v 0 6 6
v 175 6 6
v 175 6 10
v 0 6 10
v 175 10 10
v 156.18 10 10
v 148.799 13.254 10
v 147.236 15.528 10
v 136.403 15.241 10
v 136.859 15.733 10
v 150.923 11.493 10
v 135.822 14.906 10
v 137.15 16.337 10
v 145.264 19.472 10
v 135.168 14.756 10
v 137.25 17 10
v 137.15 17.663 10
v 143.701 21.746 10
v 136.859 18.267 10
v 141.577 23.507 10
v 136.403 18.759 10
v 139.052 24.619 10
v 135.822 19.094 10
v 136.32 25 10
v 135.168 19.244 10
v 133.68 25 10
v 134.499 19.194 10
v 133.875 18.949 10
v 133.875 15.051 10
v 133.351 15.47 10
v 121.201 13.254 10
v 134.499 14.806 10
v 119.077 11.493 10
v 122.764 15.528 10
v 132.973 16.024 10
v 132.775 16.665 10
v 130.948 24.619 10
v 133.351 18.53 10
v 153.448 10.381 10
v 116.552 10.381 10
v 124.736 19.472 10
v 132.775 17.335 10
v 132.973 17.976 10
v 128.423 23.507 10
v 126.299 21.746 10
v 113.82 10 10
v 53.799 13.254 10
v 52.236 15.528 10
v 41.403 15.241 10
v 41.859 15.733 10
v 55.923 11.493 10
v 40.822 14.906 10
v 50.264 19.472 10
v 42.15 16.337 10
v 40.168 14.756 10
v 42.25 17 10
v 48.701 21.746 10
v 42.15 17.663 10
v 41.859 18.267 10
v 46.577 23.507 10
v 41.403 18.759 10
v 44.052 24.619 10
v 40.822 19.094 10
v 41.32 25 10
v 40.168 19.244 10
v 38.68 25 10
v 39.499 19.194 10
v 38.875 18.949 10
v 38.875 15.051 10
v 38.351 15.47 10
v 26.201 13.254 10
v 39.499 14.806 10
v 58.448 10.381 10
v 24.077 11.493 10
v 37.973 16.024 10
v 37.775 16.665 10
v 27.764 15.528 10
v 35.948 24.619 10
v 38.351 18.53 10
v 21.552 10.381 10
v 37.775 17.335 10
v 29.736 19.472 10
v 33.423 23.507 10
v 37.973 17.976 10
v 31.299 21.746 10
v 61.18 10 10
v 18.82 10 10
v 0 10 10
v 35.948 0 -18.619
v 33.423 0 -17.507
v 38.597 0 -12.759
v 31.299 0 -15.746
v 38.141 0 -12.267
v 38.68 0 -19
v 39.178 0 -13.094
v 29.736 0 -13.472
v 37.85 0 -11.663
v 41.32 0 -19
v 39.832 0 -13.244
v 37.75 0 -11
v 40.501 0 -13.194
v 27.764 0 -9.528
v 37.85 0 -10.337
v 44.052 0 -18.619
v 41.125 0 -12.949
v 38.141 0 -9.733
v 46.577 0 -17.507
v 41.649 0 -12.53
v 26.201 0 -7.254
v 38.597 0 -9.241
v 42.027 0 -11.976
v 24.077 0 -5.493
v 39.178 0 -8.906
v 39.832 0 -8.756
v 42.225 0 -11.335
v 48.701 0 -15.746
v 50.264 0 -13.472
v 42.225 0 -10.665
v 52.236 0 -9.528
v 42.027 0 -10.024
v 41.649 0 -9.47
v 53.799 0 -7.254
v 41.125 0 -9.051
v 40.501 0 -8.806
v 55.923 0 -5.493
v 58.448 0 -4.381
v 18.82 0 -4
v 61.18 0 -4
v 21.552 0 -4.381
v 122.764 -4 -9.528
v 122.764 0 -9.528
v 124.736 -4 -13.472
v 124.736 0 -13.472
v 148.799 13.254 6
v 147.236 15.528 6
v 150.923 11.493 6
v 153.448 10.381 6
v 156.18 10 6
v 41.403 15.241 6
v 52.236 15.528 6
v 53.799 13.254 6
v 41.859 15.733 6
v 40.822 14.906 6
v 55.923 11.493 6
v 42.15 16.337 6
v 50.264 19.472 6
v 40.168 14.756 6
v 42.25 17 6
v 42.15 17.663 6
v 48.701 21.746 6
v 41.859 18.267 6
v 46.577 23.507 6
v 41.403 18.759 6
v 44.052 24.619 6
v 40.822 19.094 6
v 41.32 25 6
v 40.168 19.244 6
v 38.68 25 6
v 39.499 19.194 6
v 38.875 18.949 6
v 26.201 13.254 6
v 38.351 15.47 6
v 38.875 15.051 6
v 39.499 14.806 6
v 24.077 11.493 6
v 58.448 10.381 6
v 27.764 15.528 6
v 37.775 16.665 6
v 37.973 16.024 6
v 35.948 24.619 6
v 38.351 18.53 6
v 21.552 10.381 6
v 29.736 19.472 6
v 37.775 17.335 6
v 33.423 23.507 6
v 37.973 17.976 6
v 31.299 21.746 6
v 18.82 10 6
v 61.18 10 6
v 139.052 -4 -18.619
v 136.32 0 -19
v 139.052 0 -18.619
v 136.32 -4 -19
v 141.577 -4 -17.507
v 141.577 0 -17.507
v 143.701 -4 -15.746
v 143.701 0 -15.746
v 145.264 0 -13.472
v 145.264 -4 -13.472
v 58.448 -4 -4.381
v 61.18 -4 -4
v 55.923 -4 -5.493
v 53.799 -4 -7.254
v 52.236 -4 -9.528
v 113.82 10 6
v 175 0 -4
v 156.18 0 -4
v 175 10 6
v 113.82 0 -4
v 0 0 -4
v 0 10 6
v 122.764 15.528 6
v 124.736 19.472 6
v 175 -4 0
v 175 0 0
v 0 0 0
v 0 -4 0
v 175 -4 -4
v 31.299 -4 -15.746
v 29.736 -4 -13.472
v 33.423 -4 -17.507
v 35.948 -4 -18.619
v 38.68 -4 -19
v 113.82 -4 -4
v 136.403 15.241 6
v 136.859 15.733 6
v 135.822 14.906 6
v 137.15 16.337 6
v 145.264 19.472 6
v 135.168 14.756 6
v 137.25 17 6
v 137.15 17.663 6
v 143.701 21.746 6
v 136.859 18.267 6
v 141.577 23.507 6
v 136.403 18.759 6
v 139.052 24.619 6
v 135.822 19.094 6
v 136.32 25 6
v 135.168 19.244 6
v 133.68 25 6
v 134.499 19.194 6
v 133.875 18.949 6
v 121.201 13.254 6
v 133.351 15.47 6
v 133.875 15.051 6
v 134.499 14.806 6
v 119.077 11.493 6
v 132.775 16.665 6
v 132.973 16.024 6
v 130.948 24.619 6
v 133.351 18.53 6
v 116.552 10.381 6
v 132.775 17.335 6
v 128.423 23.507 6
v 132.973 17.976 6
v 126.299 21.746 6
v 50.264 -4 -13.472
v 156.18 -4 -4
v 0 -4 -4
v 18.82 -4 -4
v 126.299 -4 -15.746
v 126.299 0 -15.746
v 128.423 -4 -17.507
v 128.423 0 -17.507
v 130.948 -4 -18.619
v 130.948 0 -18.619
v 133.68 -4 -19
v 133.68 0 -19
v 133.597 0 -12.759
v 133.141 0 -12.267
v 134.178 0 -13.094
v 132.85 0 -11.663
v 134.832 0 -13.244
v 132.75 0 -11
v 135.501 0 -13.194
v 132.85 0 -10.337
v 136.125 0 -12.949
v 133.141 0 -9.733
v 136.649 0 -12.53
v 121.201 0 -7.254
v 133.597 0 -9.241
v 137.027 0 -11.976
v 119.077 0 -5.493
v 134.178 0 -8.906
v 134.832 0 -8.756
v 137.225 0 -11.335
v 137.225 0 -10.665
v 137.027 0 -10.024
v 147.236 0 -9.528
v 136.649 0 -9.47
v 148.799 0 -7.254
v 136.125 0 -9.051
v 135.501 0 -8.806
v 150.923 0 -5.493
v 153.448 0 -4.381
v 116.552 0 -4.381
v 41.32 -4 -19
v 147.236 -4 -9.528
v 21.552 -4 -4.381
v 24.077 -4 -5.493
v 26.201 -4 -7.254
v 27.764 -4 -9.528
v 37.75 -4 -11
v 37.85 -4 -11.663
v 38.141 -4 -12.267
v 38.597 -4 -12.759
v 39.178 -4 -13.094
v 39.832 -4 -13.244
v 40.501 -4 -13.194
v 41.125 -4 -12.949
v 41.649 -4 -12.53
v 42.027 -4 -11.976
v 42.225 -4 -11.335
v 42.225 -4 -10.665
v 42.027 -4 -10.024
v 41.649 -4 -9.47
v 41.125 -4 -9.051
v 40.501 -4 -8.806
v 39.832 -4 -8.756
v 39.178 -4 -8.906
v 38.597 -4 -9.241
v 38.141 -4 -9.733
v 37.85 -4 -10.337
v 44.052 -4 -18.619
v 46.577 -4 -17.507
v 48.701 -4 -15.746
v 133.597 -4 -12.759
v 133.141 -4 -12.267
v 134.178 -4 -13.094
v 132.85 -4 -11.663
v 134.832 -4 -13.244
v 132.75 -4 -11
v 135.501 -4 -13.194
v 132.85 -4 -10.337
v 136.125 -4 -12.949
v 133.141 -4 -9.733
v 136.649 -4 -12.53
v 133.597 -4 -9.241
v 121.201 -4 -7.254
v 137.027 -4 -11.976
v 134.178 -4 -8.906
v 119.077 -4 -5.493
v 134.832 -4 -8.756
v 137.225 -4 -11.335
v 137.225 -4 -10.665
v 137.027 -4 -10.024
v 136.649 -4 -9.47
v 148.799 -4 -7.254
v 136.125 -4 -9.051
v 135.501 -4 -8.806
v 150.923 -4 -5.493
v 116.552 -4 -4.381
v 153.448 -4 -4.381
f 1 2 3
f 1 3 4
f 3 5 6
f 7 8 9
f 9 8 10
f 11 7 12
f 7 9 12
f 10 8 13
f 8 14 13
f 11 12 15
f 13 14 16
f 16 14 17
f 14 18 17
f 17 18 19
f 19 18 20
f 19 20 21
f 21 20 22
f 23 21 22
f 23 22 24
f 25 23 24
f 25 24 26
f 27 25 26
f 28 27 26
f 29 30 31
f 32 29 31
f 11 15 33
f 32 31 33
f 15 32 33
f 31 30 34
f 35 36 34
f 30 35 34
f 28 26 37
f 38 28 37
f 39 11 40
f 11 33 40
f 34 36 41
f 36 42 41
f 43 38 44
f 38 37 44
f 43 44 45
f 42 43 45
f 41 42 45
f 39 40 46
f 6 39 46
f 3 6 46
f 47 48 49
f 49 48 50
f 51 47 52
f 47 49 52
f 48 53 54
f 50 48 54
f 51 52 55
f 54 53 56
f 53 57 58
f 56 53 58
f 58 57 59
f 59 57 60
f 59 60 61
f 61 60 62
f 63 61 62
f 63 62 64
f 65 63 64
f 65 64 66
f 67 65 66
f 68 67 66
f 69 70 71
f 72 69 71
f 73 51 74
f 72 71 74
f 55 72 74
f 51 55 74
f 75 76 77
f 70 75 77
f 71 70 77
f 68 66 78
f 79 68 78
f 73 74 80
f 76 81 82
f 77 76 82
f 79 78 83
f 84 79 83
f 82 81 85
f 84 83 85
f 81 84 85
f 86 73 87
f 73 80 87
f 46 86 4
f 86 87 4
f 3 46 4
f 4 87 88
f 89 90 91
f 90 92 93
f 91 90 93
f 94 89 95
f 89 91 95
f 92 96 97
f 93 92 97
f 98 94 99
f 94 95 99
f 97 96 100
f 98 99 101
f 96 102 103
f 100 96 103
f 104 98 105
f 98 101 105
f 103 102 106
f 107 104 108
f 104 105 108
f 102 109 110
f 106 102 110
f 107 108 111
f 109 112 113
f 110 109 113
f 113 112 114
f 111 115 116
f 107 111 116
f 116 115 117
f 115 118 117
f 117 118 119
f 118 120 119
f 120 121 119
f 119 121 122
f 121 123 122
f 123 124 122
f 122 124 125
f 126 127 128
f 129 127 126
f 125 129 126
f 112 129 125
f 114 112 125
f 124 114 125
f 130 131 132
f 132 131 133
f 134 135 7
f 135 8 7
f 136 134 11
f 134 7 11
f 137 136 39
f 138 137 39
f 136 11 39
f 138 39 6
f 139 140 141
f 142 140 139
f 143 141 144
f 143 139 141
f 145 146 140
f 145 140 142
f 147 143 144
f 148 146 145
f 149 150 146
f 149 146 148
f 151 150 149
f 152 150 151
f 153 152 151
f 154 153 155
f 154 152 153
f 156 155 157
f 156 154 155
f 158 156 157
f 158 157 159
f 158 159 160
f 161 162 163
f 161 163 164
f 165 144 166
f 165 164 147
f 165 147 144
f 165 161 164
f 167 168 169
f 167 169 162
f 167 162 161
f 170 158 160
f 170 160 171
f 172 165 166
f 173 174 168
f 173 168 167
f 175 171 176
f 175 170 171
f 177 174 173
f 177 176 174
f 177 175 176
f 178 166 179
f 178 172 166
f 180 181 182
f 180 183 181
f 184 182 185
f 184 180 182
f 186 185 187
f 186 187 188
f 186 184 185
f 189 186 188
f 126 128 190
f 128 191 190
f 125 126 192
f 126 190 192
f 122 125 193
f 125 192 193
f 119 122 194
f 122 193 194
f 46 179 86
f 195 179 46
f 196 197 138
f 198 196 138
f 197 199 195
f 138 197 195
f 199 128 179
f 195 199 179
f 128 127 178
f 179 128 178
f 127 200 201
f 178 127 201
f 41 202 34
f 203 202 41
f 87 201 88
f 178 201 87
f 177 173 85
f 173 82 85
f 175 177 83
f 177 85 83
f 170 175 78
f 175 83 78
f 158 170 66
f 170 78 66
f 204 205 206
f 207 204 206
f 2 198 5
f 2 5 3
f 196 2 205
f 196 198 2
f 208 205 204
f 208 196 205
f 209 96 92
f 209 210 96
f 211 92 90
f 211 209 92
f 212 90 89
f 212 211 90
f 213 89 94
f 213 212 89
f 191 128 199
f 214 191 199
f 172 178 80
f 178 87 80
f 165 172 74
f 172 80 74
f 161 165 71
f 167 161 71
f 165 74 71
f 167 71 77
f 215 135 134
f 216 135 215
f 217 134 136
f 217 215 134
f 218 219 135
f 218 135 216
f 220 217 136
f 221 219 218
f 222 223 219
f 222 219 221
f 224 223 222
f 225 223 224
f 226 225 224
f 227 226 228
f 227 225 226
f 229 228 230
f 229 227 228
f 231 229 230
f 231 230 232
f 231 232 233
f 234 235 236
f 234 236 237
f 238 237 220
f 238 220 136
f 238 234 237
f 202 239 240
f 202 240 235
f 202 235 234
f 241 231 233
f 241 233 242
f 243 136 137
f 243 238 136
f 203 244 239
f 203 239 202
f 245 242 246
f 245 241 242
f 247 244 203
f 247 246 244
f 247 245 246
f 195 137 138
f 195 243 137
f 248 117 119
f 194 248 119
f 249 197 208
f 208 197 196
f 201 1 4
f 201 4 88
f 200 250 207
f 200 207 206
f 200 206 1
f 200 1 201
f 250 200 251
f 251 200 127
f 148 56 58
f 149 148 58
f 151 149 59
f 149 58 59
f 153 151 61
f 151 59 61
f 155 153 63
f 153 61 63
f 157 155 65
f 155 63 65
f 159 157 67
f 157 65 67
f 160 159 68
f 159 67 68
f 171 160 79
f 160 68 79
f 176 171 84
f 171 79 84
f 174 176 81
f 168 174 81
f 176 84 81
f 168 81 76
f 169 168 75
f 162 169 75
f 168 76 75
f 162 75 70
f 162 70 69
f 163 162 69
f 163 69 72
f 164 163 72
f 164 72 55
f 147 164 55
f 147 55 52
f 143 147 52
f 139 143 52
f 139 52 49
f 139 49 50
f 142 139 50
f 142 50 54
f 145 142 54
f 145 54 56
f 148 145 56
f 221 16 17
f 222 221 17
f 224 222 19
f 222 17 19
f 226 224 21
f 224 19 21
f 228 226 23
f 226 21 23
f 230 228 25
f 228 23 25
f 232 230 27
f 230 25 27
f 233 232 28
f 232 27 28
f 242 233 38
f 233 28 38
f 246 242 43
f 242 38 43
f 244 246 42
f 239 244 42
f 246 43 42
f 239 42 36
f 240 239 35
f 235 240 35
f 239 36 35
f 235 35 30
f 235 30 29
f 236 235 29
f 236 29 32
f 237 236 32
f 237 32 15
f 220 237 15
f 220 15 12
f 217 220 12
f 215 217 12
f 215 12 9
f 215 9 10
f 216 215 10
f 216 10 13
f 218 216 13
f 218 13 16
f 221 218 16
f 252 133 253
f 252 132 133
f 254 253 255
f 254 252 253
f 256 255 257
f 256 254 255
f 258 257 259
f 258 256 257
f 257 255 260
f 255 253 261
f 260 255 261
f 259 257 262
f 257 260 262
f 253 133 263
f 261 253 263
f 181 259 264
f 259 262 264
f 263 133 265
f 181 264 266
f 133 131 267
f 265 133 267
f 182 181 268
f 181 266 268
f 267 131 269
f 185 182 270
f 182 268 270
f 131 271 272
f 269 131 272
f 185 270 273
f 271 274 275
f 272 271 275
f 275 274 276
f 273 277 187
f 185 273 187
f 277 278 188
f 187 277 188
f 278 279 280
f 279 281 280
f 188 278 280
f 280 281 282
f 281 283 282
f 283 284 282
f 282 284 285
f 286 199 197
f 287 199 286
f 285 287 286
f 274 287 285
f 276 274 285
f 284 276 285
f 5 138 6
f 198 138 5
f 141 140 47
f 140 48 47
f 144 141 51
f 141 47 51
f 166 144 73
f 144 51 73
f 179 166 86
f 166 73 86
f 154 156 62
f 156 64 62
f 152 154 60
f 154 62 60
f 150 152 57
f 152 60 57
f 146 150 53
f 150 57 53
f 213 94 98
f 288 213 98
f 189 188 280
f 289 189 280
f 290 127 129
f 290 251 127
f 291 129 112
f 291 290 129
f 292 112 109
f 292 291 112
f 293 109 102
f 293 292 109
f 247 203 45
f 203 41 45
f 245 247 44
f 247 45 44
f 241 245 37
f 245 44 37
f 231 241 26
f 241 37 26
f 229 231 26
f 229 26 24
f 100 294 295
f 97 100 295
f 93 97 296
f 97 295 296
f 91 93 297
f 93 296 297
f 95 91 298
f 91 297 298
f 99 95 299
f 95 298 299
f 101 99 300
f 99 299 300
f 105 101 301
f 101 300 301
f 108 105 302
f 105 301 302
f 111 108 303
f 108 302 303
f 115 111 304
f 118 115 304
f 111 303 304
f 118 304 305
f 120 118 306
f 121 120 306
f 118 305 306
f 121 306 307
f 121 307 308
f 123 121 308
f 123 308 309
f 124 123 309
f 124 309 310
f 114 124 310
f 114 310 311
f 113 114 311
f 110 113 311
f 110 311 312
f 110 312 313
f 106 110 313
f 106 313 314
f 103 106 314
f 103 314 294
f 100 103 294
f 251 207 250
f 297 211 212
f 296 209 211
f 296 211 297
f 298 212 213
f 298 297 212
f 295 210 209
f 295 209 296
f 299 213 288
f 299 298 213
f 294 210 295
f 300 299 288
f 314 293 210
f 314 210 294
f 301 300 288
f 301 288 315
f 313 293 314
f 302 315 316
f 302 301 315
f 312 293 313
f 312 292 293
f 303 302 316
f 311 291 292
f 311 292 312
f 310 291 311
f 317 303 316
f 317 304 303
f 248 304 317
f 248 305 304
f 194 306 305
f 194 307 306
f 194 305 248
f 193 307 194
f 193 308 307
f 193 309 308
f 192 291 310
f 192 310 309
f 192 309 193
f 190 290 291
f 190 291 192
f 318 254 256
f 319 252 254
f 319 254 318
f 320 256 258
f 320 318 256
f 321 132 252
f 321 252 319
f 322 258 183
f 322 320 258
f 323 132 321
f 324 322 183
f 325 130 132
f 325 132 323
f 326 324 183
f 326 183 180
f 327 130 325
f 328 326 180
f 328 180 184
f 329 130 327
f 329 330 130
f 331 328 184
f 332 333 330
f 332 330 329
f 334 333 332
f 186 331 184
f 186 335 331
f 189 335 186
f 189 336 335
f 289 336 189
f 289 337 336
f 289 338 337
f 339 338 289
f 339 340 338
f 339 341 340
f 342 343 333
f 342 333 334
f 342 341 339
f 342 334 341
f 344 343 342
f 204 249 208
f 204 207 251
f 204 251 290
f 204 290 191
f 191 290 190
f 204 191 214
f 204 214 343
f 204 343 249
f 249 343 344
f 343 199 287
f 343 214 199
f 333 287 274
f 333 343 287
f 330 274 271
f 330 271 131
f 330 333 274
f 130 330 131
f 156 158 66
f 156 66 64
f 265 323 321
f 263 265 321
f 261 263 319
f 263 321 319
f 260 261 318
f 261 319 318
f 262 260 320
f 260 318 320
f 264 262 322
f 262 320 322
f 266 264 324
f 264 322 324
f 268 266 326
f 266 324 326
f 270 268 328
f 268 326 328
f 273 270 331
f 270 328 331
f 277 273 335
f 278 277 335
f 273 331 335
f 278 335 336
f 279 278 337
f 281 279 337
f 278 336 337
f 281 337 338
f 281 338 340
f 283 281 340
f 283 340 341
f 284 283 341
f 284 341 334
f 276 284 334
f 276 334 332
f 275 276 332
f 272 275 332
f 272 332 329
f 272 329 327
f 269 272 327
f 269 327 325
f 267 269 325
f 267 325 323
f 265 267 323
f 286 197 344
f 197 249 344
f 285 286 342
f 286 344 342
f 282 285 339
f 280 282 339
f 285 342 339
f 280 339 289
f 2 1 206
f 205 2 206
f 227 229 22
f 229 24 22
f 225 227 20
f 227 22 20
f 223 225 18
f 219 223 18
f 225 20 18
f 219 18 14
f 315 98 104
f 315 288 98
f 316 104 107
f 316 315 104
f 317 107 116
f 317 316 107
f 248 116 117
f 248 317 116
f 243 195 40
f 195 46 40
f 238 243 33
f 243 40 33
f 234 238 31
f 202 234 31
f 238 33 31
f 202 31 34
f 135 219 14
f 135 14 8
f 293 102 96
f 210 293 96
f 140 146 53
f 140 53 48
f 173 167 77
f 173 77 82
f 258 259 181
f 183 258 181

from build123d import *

# Parameters (mm, degrees)
ESTRUSIONE_ESTRUSIONE1_DEPTH = 175
ESTRUSIONE_ESTRUSIONE2_DEPTH = 4
ESTRUSIONE_ESTRUSIONE3_DEPTH = 4
RACCORDO1_R                  = 10
FORO_PER_VITE_M4_1_D         = 4.5
FORO_PER_VITE_M4_1_DEPTH     = 13
FORO_PER_VITE_M4_1_TIP       = 1.351936393
FORO_PER_VITE_M4_2_D         = 4.5
FORO_PER_VITE_M4_2_DEPTH     = 13
FORO_PER_VITE_M4_2_TIP       = 1.351936393


with BuildPart() as part:
    # Schizzo3 → Estrusione-Estrusione1 (new body)
    with BuildSketch(Plane(origin=(0, 0, 0), x_dir=(0, 0, -1), z_dir=(1, 0, 0))):
        Polygon((0, 0), (4, 0), (-6, 10), (-6, 6), align=None)
    extrude(amount=ESTRUSIONE_ESTRUSIONE1_DEPTH)

    # Schizzo4 → Estrusione-Estrusione2 (add)
    with BuildSketch(Plane.XZ):
        Polygon((25, -4), (32.5, -19), (47.5, -19), (55, -4), (120, -4), (127.5, -19), (142.5, -19), (150, -4), (175, -4), (175, 0), (0, 0), (0, -4), align=None)
    extrude(amount=ESTRUSIONE_ESTRUSIONE2_DEPTH)

    # Schizzo5 → Estrusione-Estrusione3 (add)
    with BuildSketch(Plane.XY.offset(6)):
        Polygon((0, 6), (0, 10), (25, 10), (32.5, 25), (47.5, 25), (55, 10), (120, 10), (127.5, 25), (142.5, 25), (150, 10), (175, 10), (175, 6), align=None)
    extrude(amount=ESTRUSIONE_ESTRUSIONE3_DEPTH)

    # Raccordo1
    raccordo1_edges = [part.edges().sort_by_distance(p)[0] for p in [
        (25, -2, -4),
        (32.5, -2, -19),
        (47.5, -2, -19),
        (55, -2, -4),
        (120, -2, -4),
        (127.5, -2, -19),
        (142.5, -2, -19),
        (150, -2, -4),
        (150, 10, 8),
        (142.5, 25, 8),
        (127.5, 25, 8),
        (120, 10, 8),
        (55, 10, 8),
        (47.5, 25, 8),
        (32.5, 25, 8),
        (25, 10, 8),
    ]]
    fillet(raccordo1_edges, radius=RACCORDO1_R)

    # Foro per Vite M4-1
    with Locations(Plane(origin=(0, 0, 0), x_dir=(1, 0, 0), z_dir=(0, 1, 0))):
        with Locations((135, 11), (40, 11)):
            Hole(FORO_PER_VITE_M4_1_D / 2, depth=FORO_PER_VITE_M4_1_DEPTH)
            with Locations((0, 0, -(FORO_PER_VITE_M4_1_DEPTH + FORO_PER_VITE_M4_1_TIP / 2))):  # 118° drill point
                Cone(0, FORO_PER_VITE_M4_1_D / 2, FORO_PER_VITE_M4_1_TIP, mode=Mode.SUBTRACT)

    # Foro per Vite M4-2
    with Locations(Plane(origin=(0, 0, 6), x_dir=(-1, 0, 0), z_dir=(0, 0, -1))):
        with Locations((-40, 17), (-135, 17)):
            Hole(FORO_PER_VITE_M4_2_D / 2, depth=FORO_PER_VITE_M4_2_DEPTH)
            with Locations((0, 0, -(FORO_PER_VITE_M4_2_DEPTH + FORO_PER_VITE_M4_2_TIP / 2))):  # 118° drill point
                Cone(0, FORO_PER_VITE_M4_2_D / 2, FORO_PER_VITE_M4_2_TIP, mode=Mode.SUBTRACT)


solid = part.part
